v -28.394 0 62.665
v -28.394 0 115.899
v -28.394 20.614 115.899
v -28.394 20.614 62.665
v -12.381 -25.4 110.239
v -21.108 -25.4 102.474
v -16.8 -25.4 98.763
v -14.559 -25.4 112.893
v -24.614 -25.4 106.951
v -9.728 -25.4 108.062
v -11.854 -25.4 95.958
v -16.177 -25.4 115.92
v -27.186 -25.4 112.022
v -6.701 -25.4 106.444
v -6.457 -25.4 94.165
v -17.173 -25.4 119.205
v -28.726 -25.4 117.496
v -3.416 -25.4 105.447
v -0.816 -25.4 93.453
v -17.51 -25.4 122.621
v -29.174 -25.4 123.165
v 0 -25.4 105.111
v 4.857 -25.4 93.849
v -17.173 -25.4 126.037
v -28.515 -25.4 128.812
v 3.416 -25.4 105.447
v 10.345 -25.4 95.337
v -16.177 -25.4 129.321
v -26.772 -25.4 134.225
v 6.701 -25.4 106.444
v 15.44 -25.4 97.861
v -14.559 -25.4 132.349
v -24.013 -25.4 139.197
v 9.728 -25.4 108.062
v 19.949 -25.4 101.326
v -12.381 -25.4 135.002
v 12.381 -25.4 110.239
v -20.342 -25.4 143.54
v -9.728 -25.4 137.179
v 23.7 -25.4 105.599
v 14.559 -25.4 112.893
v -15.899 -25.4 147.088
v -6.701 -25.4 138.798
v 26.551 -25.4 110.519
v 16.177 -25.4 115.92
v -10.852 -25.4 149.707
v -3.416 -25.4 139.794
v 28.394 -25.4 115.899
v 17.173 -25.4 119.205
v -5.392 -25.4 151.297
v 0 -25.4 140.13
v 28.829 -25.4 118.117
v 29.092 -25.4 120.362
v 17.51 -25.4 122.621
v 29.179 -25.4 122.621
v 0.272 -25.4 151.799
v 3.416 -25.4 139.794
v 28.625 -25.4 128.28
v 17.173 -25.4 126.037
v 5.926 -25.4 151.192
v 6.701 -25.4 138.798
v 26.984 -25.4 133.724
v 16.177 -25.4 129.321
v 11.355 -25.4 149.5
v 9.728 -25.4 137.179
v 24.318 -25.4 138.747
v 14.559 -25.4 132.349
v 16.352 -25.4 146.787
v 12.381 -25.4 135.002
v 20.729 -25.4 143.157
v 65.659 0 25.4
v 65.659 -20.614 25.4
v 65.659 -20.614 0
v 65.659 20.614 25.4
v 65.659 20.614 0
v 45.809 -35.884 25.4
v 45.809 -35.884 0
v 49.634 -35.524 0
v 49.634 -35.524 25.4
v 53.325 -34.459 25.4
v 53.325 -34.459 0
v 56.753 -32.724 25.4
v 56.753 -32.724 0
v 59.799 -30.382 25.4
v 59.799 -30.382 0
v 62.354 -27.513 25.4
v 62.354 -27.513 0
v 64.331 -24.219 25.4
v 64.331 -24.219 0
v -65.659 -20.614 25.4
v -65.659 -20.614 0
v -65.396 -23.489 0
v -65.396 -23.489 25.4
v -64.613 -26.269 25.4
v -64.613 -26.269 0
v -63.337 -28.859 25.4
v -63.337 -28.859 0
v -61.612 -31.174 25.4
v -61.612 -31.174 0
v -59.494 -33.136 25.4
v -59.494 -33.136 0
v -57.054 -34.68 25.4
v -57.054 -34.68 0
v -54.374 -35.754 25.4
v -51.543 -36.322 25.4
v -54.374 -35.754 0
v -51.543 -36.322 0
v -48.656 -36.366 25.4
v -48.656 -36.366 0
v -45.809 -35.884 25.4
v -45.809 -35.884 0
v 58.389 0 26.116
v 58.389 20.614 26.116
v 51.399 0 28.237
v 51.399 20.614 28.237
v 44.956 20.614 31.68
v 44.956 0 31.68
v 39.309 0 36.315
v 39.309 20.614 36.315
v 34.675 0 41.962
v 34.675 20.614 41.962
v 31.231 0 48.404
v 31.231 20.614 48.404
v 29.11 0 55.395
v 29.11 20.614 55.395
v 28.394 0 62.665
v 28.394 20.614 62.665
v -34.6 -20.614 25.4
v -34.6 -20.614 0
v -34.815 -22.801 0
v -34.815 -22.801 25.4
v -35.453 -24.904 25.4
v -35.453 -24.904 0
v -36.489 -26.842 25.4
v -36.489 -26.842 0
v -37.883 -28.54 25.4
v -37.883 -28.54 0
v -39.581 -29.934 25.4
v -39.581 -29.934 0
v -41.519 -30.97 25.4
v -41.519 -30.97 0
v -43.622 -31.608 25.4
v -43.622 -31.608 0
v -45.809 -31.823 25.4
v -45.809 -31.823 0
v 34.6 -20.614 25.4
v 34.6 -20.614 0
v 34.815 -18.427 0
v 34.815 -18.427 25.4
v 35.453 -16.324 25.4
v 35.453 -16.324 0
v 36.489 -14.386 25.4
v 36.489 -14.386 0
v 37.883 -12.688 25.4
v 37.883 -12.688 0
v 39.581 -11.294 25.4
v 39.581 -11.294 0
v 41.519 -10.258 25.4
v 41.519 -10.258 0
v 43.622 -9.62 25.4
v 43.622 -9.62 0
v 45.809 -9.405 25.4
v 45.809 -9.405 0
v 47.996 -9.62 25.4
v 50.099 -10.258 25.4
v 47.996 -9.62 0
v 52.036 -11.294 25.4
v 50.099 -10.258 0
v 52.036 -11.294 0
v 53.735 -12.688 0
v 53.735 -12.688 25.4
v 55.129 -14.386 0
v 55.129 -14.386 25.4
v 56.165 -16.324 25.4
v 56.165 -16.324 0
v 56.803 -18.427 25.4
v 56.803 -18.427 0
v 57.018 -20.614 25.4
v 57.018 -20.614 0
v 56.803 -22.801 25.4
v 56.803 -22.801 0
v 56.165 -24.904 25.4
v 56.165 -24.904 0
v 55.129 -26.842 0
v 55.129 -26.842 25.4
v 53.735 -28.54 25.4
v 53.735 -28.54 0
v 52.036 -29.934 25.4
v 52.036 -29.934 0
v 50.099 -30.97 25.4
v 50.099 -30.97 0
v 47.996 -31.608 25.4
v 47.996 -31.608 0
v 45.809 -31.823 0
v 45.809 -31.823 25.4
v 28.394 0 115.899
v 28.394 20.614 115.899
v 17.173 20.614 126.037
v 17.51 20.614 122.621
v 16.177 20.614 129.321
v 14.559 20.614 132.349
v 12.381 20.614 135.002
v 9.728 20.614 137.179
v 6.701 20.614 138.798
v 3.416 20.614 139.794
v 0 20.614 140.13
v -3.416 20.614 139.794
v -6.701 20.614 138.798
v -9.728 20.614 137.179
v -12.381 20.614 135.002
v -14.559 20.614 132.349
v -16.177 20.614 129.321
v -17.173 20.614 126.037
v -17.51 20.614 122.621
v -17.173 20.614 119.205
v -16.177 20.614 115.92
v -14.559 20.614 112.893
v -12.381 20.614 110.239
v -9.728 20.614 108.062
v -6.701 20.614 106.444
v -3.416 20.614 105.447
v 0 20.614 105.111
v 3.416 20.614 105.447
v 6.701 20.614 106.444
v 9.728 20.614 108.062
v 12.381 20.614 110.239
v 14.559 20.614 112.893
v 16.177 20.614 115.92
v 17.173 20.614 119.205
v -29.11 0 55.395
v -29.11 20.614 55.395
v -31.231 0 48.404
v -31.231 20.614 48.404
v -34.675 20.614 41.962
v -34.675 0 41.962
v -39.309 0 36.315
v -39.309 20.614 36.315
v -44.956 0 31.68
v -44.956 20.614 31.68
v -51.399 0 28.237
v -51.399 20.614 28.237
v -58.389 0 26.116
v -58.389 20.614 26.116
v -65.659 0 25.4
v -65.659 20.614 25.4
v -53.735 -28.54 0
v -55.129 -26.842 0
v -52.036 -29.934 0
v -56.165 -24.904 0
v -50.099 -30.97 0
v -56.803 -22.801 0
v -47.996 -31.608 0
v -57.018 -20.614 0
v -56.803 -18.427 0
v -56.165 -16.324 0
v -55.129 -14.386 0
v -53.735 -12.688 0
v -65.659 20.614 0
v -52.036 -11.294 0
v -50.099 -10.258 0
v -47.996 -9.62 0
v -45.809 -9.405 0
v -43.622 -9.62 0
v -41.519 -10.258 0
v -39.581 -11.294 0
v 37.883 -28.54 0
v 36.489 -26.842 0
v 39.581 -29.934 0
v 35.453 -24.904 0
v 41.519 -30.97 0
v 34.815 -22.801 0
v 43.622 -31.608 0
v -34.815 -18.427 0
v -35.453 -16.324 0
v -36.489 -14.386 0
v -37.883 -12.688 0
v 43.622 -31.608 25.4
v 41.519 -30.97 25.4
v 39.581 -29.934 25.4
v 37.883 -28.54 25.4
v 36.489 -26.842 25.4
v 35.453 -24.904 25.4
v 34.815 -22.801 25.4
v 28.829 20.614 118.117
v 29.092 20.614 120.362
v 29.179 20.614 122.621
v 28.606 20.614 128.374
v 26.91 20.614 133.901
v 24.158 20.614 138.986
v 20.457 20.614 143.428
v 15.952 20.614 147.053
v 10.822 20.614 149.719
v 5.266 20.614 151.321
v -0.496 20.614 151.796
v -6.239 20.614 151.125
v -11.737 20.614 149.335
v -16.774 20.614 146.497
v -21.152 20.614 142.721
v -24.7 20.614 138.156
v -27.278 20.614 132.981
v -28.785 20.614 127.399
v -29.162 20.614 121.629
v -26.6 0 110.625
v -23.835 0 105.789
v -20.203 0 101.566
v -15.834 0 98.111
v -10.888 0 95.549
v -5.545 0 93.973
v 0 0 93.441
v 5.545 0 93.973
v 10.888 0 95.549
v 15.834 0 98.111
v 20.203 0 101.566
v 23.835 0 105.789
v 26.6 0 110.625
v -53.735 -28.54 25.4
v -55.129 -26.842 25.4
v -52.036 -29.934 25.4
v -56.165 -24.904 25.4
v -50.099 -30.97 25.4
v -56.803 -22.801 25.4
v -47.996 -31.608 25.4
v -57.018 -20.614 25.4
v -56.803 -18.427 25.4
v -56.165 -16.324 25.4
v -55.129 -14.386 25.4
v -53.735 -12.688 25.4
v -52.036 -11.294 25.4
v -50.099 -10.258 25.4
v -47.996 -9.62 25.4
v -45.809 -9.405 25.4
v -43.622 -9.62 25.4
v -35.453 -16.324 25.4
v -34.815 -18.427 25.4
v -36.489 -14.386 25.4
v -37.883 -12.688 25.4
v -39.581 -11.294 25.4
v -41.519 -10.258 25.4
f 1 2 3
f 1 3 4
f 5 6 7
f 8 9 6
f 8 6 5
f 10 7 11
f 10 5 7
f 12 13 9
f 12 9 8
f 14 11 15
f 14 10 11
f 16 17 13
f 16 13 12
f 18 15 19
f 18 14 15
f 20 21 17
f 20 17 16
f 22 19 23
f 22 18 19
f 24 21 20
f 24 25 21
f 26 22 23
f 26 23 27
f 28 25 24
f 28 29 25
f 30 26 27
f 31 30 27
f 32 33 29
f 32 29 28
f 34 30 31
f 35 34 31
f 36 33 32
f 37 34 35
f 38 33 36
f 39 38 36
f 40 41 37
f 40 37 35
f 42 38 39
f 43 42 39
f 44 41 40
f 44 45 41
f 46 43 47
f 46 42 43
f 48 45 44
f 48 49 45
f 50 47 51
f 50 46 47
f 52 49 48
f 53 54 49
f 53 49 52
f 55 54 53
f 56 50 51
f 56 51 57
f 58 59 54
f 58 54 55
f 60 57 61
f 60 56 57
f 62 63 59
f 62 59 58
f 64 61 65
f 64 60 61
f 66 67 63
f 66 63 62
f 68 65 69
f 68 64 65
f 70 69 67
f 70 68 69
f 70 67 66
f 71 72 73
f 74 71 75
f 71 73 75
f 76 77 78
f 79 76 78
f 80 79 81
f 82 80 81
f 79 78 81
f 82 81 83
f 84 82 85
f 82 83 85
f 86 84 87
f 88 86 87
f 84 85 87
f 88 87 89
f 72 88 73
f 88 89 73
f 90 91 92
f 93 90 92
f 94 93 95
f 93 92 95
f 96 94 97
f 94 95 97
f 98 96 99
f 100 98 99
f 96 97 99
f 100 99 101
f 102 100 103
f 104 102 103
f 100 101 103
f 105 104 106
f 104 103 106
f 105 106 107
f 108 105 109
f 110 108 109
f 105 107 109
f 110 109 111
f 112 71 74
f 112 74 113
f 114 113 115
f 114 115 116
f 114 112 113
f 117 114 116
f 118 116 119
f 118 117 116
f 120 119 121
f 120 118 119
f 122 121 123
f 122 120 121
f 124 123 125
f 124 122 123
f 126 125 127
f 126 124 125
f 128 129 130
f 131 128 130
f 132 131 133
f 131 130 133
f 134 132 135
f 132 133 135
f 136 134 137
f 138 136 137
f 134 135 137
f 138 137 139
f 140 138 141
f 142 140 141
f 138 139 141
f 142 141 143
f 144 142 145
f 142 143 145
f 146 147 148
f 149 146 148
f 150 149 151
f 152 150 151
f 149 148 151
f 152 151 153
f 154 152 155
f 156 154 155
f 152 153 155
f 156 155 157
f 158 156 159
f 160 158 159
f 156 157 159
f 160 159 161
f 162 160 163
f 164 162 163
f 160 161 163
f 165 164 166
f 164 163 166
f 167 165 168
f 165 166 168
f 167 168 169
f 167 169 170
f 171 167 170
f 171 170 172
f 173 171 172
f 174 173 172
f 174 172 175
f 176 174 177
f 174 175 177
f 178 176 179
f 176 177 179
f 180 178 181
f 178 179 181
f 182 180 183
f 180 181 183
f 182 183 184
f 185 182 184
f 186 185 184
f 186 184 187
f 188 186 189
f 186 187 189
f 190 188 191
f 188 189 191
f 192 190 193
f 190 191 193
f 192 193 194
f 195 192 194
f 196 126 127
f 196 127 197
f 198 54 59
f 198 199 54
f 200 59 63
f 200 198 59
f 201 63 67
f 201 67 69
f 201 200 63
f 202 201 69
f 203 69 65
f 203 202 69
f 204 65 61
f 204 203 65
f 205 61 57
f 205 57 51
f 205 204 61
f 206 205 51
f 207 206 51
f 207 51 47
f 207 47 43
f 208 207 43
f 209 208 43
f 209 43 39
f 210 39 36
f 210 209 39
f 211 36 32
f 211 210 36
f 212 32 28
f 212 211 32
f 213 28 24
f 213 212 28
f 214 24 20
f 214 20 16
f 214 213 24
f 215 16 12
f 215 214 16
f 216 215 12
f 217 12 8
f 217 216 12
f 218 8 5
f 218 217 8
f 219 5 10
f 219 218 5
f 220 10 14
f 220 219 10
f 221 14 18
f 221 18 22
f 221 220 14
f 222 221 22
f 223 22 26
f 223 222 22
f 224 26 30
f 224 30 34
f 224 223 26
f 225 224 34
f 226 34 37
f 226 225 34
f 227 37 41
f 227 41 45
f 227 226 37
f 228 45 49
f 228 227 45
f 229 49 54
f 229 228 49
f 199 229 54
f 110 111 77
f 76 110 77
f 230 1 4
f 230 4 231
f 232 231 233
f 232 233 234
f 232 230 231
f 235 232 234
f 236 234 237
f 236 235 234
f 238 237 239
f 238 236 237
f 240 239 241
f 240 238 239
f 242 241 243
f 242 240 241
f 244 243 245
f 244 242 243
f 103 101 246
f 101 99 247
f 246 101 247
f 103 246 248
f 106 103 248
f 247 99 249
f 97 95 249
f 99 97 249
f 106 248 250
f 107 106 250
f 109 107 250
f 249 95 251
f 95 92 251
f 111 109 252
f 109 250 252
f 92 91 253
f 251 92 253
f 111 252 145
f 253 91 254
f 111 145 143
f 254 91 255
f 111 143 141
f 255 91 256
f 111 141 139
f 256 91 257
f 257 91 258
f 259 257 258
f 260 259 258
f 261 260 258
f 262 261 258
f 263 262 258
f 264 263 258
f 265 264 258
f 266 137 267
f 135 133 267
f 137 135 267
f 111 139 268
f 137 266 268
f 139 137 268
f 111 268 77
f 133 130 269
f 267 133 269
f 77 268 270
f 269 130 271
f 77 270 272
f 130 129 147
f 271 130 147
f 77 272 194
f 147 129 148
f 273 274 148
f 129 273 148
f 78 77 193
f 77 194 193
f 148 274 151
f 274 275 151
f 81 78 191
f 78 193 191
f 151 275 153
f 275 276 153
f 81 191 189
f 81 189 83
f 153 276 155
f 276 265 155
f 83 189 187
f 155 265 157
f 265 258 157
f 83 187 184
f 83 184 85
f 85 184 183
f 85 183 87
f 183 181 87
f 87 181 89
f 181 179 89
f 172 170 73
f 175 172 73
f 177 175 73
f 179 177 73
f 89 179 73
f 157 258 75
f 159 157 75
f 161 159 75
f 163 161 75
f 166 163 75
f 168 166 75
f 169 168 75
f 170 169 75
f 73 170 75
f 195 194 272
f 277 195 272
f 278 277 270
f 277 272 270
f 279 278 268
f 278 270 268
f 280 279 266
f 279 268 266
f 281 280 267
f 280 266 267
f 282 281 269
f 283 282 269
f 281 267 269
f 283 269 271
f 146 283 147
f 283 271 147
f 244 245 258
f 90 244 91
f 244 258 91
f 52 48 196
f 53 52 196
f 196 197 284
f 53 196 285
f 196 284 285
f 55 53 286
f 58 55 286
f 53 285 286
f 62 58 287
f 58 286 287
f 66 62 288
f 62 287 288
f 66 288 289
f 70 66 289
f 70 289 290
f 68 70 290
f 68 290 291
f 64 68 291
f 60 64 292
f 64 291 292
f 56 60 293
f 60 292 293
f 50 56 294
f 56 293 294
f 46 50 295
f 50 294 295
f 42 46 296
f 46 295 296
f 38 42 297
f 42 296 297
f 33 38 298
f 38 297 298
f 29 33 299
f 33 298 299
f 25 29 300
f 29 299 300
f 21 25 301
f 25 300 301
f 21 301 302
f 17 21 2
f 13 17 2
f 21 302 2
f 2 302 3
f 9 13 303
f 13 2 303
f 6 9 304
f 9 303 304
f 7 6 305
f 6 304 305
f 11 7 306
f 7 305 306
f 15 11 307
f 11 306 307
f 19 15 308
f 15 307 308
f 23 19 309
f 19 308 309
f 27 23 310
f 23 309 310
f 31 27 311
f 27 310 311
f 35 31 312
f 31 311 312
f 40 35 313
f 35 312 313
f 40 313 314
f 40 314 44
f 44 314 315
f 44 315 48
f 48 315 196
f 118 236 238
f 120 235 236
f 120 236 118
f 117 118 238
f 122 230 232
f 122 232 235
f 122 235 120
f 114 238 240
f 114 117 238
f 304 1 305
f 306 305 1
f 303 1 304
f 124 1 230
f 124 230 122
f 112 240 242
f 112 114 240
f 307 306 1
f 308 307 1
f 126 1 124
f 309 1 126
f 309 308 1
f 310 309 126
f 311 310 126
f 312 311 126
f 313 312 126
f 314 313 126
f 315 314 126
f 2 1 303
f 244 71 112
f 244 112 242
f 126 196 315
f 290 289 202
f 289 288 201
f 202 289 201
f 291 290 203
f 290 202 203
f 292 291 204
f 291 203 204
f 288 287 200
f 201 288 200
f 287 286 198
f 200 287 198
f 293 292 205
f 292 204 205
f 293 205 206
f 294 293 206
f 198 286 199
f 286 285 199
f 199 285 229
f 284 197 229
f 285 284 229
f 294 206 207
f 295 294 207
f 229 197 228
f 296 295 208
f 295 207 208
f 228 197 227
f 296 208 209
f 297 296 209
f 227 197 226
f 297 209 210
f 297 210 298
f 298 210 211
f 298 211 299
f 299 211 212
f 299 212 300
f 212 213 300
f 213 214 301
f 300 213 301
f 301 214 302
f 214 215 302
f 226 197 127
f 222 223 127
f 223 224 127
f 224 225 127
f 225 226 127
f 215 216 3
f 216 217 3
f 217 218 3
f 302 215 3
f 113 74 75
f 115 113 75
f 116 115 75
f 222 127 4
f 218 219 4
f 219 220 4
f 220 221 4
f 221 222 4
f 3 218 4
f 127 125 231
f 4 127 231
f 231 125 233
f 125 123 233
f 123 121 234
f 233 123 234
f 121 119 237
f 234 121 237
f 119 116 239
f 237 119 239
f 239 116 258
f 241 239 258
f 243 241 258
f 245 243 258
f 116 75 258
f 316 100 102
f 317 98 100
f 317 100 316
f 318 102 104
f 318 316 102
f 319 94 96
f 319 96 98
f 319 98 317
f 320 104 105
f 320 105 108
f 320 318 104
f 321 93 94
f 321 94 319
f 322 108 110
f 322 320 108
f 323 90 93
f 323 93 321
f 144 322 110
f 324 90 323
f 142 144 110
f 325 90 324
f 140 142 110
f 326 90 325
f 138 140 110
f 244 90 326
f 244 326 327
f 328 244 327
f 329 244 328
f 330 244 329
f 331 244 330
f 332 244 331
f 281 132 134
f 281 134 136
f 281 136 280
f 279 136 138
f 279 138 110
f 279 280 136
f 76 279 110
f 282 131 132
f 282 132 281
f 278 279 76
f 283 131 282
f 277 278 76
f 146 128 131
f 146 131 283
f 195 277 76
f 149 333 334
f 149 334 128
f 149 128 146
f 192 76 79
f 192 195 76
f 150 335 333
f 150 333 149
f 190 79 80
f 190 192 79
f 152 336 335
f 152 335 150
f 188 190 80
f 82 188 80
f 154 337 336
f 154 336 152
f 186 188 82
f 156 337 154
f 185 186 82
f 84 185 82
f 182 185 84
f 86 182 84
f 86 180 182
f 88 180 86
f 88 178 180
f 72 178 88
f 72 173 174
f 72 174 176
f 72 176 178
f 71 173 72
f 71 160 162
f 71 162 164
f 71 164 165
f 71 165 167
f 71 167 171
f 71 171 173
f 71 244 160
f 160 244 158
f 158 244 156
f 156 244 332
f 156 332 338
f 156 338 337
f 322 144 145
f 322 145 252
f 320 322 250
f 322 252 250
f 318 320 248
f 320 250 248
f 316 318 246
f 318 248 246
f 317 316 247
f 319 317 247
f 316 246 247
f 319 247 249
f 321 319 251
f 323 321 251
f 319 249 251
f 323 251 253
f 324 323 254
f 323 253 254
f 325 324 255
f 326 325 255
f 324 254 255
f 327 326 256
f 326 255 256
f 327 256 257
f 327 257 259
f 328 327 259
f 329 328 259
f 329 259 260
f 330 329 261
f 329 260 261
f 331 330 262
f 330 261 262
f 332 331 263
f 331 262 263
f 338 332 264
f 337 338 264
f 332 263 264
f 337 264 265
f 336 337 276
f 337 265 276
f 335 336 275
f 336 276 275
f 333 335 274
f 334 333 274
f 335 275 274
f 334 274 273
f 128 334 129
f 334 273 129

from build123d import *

# Parameters (mm, degrees)
F1_DEPTH = 25.4
F2_W     = 56.788672138
F2_H     = 0.0079375762
F2_R     = 17.5097347042
F3_DEPTH = 20.6140112132
F4_DEPTH = 25.4


with BuildPart() as f1:
    # F0 (on Top) → F1 (new body)
    with BuildSketch(Plane.XY):
        with BuildLine():
            Line((-45.808903873, -35.8836464584), (45.808903873, -35.8836464584))
            Line((45.808903873, -35.8836464584), (45.808903873, -31.8233038162))
            ThreePointArc((45.808903873, -31.8233038162), (37.8827370611, -28.5401780251), (34.5996112699, -20.6140112132))
            Line((34.5996112699, -20.6140112132), (-34.5996112699, -20.6140112132))
            ThreePointArc((-34.5996112699, -20.6140112132), (-37.8827370611, -28.5401780251), (-45.808903873, -31.8233038162))
            Line((-45.808903873, -31.8233038162), (-45.808903873, -35.8836464584))
        make_face()
        with BuildLine():
            ThreePointArc((-65.6594336033, -20.6140112132), (-59.4935648199, -33.1360447052), (-45.808903873, -35.8836464584))
            Line((-45.808903873, -35.8836464584), (-45.808903873, -31.8233038162))
            ThreePointArc((-45.808903873, -31.8233038162), (-53.7350706849, -28.5401780251), (-57.018196476, -20.6140112132))
            Line((-57.018196476, -20.6140112132), (-65.6594336033, -20.6140112132))
        make_face()
        with BuildLine():
            ThreePointArc((45.808903873, -35.8836464584), (58.3309373649, -31.6246287158), (65.6594336033, -20.6140112132))
            Line((65.6594336033, -20.6140112132), (57.018196476, -20.6140112132))
            ThreePointArc((57.018196476, -20.6140112132), (53.7350706849, -28.5401780251), (45.808903873, -31.8233038162))
            Line((45.808903873, -31.8233038162), (45.808903873, -35.8836464584))
        make_face()
        with BuildLine():
            Line((57.018196476, -20.6140112132), (65.6594336033, -20.6140112132))
            Line((65.6594336033, -20.6140112132), (65.6594336033, 20.6140112132))
            Line((65.6594336033, 20.6140112132), (-65.6594336033, 20.6140112132))
            Line((-65.6594336033, 20.6140112132), (-65.6594336033, -20.6140112132))
            Line((-65.6594336033, -20.6140112132), (-57.018196476, -20.6140112132))
            ThreePointArc((-57.018196476, -20.6140112132), (-45.808903873, -9.4047186102), (-34.5996112699, -20.6140112132))
            Line((-34.5996112699, -20.6140112132), (34.5996112699, -20.6140112132))
            ThreePointArc((34.5996112699, -20.6140112132), (45.808903873, -9.4047186102), (57.018196476, -20.6140112132))
        make_face()
    extrude(amount=F1_DEPTH)

    # F2 (on Front) → F3 (join, through all)
    with BuildSketch(Plane.XZ):
        with Locations((0, 25.3960312119)):
            Rectangle(F2_W, F2_H)
        with BuildLine():
            ThreePointArc((65.6594336033, 25.4), (39.3090304352, 36.3146943662), (28.394336069, 62.6650975343))
            Line((28.394336069, 62.6650975343), (28.394336069, 25.4))
            Line((28.394336069, 25.4), (45.808903873, 25.4))
            Line((45.808903873, 25.4), (65.6594336033, 25.4))
        make_face()
        with BuildLine():
            ThreePointArc((28.394336069, 115.8985176562), (0, 93.4414670745), (-28.394336069, 115.8985176562))
            Line((-28.394336069, 115.8985176562), (-28.394336069, 62.6650975343))
            Line((-28.394336069, 62.6650975343), (-28.394336069, 25.4))
            Line((-28.394336069, 25.4), (28.394336069, 25.4))
            Line((28.394336069, 25.4), (28.394336069, 62.6650975343))
            Line((28.394336069, 62.6650975343), (28.394336069, 115.8985176562))
        make_face()
        with BuildLine():
            Line((-28.394336069, 25.4), (-28.394336069, 62.6650975343))
            ThreePointArc((-28.394336069, 62.6650975343), (-39.3090304352, 36.3146943662), (-65.6594336033, 25.4))
            Line((-65.6594336033, 25.4), (-45.808903873, 25.4))
            Line((-45.808903873, 25.4), (-28.394336069, 25.4))
        make_face()
        with BuildLine():
            ThreePointArc((28.394336069, 115.8985176562), (28.9823181644, 119.2367591717), (29.179197795, 122.6206648695))
            ThreePointArc((29.179197795, 122.6206648695), (-3.3839056978, 151.6029830339), (-28.394336069, 115.8985176562))
            ThreePointArc((-28.394336069, 115.8985176562), (0, 93.4414670745), (28.394336069, 115.8985176562))
        make_face()
        with Locations((0, 122.6206648695)):
            Circle(F2_R, mode=Mode.SUBTRACT)
    extrude(amount=-F3_DEPTH)

    # F2 (on Front) → F4 (join)
    with BuildSketch(Plane.XZ):
        with BuildLine():
            ThreePointArc((28.394336069, 115.8985176562), (28.9823181644, 119.2367591717), (29.179197795, 122.6206648695))
            ThreePointArc((29.179197795, 122.6206648695), (-3.3839056978, 151.6029830339), (-28.394336069, 115.8985176562))
            ThreePointArc((-28.394336069, 115.8985176562), (0, 93.4414670745), (28.394336069, 115.8985176562))
        make_face()
        with Locations((0, 122.6206648695)):
            Circle(F2_R, mode=Mode.SUBTRACT)
    extrude(amount=F4_DEPTH)


solid = f1.part
